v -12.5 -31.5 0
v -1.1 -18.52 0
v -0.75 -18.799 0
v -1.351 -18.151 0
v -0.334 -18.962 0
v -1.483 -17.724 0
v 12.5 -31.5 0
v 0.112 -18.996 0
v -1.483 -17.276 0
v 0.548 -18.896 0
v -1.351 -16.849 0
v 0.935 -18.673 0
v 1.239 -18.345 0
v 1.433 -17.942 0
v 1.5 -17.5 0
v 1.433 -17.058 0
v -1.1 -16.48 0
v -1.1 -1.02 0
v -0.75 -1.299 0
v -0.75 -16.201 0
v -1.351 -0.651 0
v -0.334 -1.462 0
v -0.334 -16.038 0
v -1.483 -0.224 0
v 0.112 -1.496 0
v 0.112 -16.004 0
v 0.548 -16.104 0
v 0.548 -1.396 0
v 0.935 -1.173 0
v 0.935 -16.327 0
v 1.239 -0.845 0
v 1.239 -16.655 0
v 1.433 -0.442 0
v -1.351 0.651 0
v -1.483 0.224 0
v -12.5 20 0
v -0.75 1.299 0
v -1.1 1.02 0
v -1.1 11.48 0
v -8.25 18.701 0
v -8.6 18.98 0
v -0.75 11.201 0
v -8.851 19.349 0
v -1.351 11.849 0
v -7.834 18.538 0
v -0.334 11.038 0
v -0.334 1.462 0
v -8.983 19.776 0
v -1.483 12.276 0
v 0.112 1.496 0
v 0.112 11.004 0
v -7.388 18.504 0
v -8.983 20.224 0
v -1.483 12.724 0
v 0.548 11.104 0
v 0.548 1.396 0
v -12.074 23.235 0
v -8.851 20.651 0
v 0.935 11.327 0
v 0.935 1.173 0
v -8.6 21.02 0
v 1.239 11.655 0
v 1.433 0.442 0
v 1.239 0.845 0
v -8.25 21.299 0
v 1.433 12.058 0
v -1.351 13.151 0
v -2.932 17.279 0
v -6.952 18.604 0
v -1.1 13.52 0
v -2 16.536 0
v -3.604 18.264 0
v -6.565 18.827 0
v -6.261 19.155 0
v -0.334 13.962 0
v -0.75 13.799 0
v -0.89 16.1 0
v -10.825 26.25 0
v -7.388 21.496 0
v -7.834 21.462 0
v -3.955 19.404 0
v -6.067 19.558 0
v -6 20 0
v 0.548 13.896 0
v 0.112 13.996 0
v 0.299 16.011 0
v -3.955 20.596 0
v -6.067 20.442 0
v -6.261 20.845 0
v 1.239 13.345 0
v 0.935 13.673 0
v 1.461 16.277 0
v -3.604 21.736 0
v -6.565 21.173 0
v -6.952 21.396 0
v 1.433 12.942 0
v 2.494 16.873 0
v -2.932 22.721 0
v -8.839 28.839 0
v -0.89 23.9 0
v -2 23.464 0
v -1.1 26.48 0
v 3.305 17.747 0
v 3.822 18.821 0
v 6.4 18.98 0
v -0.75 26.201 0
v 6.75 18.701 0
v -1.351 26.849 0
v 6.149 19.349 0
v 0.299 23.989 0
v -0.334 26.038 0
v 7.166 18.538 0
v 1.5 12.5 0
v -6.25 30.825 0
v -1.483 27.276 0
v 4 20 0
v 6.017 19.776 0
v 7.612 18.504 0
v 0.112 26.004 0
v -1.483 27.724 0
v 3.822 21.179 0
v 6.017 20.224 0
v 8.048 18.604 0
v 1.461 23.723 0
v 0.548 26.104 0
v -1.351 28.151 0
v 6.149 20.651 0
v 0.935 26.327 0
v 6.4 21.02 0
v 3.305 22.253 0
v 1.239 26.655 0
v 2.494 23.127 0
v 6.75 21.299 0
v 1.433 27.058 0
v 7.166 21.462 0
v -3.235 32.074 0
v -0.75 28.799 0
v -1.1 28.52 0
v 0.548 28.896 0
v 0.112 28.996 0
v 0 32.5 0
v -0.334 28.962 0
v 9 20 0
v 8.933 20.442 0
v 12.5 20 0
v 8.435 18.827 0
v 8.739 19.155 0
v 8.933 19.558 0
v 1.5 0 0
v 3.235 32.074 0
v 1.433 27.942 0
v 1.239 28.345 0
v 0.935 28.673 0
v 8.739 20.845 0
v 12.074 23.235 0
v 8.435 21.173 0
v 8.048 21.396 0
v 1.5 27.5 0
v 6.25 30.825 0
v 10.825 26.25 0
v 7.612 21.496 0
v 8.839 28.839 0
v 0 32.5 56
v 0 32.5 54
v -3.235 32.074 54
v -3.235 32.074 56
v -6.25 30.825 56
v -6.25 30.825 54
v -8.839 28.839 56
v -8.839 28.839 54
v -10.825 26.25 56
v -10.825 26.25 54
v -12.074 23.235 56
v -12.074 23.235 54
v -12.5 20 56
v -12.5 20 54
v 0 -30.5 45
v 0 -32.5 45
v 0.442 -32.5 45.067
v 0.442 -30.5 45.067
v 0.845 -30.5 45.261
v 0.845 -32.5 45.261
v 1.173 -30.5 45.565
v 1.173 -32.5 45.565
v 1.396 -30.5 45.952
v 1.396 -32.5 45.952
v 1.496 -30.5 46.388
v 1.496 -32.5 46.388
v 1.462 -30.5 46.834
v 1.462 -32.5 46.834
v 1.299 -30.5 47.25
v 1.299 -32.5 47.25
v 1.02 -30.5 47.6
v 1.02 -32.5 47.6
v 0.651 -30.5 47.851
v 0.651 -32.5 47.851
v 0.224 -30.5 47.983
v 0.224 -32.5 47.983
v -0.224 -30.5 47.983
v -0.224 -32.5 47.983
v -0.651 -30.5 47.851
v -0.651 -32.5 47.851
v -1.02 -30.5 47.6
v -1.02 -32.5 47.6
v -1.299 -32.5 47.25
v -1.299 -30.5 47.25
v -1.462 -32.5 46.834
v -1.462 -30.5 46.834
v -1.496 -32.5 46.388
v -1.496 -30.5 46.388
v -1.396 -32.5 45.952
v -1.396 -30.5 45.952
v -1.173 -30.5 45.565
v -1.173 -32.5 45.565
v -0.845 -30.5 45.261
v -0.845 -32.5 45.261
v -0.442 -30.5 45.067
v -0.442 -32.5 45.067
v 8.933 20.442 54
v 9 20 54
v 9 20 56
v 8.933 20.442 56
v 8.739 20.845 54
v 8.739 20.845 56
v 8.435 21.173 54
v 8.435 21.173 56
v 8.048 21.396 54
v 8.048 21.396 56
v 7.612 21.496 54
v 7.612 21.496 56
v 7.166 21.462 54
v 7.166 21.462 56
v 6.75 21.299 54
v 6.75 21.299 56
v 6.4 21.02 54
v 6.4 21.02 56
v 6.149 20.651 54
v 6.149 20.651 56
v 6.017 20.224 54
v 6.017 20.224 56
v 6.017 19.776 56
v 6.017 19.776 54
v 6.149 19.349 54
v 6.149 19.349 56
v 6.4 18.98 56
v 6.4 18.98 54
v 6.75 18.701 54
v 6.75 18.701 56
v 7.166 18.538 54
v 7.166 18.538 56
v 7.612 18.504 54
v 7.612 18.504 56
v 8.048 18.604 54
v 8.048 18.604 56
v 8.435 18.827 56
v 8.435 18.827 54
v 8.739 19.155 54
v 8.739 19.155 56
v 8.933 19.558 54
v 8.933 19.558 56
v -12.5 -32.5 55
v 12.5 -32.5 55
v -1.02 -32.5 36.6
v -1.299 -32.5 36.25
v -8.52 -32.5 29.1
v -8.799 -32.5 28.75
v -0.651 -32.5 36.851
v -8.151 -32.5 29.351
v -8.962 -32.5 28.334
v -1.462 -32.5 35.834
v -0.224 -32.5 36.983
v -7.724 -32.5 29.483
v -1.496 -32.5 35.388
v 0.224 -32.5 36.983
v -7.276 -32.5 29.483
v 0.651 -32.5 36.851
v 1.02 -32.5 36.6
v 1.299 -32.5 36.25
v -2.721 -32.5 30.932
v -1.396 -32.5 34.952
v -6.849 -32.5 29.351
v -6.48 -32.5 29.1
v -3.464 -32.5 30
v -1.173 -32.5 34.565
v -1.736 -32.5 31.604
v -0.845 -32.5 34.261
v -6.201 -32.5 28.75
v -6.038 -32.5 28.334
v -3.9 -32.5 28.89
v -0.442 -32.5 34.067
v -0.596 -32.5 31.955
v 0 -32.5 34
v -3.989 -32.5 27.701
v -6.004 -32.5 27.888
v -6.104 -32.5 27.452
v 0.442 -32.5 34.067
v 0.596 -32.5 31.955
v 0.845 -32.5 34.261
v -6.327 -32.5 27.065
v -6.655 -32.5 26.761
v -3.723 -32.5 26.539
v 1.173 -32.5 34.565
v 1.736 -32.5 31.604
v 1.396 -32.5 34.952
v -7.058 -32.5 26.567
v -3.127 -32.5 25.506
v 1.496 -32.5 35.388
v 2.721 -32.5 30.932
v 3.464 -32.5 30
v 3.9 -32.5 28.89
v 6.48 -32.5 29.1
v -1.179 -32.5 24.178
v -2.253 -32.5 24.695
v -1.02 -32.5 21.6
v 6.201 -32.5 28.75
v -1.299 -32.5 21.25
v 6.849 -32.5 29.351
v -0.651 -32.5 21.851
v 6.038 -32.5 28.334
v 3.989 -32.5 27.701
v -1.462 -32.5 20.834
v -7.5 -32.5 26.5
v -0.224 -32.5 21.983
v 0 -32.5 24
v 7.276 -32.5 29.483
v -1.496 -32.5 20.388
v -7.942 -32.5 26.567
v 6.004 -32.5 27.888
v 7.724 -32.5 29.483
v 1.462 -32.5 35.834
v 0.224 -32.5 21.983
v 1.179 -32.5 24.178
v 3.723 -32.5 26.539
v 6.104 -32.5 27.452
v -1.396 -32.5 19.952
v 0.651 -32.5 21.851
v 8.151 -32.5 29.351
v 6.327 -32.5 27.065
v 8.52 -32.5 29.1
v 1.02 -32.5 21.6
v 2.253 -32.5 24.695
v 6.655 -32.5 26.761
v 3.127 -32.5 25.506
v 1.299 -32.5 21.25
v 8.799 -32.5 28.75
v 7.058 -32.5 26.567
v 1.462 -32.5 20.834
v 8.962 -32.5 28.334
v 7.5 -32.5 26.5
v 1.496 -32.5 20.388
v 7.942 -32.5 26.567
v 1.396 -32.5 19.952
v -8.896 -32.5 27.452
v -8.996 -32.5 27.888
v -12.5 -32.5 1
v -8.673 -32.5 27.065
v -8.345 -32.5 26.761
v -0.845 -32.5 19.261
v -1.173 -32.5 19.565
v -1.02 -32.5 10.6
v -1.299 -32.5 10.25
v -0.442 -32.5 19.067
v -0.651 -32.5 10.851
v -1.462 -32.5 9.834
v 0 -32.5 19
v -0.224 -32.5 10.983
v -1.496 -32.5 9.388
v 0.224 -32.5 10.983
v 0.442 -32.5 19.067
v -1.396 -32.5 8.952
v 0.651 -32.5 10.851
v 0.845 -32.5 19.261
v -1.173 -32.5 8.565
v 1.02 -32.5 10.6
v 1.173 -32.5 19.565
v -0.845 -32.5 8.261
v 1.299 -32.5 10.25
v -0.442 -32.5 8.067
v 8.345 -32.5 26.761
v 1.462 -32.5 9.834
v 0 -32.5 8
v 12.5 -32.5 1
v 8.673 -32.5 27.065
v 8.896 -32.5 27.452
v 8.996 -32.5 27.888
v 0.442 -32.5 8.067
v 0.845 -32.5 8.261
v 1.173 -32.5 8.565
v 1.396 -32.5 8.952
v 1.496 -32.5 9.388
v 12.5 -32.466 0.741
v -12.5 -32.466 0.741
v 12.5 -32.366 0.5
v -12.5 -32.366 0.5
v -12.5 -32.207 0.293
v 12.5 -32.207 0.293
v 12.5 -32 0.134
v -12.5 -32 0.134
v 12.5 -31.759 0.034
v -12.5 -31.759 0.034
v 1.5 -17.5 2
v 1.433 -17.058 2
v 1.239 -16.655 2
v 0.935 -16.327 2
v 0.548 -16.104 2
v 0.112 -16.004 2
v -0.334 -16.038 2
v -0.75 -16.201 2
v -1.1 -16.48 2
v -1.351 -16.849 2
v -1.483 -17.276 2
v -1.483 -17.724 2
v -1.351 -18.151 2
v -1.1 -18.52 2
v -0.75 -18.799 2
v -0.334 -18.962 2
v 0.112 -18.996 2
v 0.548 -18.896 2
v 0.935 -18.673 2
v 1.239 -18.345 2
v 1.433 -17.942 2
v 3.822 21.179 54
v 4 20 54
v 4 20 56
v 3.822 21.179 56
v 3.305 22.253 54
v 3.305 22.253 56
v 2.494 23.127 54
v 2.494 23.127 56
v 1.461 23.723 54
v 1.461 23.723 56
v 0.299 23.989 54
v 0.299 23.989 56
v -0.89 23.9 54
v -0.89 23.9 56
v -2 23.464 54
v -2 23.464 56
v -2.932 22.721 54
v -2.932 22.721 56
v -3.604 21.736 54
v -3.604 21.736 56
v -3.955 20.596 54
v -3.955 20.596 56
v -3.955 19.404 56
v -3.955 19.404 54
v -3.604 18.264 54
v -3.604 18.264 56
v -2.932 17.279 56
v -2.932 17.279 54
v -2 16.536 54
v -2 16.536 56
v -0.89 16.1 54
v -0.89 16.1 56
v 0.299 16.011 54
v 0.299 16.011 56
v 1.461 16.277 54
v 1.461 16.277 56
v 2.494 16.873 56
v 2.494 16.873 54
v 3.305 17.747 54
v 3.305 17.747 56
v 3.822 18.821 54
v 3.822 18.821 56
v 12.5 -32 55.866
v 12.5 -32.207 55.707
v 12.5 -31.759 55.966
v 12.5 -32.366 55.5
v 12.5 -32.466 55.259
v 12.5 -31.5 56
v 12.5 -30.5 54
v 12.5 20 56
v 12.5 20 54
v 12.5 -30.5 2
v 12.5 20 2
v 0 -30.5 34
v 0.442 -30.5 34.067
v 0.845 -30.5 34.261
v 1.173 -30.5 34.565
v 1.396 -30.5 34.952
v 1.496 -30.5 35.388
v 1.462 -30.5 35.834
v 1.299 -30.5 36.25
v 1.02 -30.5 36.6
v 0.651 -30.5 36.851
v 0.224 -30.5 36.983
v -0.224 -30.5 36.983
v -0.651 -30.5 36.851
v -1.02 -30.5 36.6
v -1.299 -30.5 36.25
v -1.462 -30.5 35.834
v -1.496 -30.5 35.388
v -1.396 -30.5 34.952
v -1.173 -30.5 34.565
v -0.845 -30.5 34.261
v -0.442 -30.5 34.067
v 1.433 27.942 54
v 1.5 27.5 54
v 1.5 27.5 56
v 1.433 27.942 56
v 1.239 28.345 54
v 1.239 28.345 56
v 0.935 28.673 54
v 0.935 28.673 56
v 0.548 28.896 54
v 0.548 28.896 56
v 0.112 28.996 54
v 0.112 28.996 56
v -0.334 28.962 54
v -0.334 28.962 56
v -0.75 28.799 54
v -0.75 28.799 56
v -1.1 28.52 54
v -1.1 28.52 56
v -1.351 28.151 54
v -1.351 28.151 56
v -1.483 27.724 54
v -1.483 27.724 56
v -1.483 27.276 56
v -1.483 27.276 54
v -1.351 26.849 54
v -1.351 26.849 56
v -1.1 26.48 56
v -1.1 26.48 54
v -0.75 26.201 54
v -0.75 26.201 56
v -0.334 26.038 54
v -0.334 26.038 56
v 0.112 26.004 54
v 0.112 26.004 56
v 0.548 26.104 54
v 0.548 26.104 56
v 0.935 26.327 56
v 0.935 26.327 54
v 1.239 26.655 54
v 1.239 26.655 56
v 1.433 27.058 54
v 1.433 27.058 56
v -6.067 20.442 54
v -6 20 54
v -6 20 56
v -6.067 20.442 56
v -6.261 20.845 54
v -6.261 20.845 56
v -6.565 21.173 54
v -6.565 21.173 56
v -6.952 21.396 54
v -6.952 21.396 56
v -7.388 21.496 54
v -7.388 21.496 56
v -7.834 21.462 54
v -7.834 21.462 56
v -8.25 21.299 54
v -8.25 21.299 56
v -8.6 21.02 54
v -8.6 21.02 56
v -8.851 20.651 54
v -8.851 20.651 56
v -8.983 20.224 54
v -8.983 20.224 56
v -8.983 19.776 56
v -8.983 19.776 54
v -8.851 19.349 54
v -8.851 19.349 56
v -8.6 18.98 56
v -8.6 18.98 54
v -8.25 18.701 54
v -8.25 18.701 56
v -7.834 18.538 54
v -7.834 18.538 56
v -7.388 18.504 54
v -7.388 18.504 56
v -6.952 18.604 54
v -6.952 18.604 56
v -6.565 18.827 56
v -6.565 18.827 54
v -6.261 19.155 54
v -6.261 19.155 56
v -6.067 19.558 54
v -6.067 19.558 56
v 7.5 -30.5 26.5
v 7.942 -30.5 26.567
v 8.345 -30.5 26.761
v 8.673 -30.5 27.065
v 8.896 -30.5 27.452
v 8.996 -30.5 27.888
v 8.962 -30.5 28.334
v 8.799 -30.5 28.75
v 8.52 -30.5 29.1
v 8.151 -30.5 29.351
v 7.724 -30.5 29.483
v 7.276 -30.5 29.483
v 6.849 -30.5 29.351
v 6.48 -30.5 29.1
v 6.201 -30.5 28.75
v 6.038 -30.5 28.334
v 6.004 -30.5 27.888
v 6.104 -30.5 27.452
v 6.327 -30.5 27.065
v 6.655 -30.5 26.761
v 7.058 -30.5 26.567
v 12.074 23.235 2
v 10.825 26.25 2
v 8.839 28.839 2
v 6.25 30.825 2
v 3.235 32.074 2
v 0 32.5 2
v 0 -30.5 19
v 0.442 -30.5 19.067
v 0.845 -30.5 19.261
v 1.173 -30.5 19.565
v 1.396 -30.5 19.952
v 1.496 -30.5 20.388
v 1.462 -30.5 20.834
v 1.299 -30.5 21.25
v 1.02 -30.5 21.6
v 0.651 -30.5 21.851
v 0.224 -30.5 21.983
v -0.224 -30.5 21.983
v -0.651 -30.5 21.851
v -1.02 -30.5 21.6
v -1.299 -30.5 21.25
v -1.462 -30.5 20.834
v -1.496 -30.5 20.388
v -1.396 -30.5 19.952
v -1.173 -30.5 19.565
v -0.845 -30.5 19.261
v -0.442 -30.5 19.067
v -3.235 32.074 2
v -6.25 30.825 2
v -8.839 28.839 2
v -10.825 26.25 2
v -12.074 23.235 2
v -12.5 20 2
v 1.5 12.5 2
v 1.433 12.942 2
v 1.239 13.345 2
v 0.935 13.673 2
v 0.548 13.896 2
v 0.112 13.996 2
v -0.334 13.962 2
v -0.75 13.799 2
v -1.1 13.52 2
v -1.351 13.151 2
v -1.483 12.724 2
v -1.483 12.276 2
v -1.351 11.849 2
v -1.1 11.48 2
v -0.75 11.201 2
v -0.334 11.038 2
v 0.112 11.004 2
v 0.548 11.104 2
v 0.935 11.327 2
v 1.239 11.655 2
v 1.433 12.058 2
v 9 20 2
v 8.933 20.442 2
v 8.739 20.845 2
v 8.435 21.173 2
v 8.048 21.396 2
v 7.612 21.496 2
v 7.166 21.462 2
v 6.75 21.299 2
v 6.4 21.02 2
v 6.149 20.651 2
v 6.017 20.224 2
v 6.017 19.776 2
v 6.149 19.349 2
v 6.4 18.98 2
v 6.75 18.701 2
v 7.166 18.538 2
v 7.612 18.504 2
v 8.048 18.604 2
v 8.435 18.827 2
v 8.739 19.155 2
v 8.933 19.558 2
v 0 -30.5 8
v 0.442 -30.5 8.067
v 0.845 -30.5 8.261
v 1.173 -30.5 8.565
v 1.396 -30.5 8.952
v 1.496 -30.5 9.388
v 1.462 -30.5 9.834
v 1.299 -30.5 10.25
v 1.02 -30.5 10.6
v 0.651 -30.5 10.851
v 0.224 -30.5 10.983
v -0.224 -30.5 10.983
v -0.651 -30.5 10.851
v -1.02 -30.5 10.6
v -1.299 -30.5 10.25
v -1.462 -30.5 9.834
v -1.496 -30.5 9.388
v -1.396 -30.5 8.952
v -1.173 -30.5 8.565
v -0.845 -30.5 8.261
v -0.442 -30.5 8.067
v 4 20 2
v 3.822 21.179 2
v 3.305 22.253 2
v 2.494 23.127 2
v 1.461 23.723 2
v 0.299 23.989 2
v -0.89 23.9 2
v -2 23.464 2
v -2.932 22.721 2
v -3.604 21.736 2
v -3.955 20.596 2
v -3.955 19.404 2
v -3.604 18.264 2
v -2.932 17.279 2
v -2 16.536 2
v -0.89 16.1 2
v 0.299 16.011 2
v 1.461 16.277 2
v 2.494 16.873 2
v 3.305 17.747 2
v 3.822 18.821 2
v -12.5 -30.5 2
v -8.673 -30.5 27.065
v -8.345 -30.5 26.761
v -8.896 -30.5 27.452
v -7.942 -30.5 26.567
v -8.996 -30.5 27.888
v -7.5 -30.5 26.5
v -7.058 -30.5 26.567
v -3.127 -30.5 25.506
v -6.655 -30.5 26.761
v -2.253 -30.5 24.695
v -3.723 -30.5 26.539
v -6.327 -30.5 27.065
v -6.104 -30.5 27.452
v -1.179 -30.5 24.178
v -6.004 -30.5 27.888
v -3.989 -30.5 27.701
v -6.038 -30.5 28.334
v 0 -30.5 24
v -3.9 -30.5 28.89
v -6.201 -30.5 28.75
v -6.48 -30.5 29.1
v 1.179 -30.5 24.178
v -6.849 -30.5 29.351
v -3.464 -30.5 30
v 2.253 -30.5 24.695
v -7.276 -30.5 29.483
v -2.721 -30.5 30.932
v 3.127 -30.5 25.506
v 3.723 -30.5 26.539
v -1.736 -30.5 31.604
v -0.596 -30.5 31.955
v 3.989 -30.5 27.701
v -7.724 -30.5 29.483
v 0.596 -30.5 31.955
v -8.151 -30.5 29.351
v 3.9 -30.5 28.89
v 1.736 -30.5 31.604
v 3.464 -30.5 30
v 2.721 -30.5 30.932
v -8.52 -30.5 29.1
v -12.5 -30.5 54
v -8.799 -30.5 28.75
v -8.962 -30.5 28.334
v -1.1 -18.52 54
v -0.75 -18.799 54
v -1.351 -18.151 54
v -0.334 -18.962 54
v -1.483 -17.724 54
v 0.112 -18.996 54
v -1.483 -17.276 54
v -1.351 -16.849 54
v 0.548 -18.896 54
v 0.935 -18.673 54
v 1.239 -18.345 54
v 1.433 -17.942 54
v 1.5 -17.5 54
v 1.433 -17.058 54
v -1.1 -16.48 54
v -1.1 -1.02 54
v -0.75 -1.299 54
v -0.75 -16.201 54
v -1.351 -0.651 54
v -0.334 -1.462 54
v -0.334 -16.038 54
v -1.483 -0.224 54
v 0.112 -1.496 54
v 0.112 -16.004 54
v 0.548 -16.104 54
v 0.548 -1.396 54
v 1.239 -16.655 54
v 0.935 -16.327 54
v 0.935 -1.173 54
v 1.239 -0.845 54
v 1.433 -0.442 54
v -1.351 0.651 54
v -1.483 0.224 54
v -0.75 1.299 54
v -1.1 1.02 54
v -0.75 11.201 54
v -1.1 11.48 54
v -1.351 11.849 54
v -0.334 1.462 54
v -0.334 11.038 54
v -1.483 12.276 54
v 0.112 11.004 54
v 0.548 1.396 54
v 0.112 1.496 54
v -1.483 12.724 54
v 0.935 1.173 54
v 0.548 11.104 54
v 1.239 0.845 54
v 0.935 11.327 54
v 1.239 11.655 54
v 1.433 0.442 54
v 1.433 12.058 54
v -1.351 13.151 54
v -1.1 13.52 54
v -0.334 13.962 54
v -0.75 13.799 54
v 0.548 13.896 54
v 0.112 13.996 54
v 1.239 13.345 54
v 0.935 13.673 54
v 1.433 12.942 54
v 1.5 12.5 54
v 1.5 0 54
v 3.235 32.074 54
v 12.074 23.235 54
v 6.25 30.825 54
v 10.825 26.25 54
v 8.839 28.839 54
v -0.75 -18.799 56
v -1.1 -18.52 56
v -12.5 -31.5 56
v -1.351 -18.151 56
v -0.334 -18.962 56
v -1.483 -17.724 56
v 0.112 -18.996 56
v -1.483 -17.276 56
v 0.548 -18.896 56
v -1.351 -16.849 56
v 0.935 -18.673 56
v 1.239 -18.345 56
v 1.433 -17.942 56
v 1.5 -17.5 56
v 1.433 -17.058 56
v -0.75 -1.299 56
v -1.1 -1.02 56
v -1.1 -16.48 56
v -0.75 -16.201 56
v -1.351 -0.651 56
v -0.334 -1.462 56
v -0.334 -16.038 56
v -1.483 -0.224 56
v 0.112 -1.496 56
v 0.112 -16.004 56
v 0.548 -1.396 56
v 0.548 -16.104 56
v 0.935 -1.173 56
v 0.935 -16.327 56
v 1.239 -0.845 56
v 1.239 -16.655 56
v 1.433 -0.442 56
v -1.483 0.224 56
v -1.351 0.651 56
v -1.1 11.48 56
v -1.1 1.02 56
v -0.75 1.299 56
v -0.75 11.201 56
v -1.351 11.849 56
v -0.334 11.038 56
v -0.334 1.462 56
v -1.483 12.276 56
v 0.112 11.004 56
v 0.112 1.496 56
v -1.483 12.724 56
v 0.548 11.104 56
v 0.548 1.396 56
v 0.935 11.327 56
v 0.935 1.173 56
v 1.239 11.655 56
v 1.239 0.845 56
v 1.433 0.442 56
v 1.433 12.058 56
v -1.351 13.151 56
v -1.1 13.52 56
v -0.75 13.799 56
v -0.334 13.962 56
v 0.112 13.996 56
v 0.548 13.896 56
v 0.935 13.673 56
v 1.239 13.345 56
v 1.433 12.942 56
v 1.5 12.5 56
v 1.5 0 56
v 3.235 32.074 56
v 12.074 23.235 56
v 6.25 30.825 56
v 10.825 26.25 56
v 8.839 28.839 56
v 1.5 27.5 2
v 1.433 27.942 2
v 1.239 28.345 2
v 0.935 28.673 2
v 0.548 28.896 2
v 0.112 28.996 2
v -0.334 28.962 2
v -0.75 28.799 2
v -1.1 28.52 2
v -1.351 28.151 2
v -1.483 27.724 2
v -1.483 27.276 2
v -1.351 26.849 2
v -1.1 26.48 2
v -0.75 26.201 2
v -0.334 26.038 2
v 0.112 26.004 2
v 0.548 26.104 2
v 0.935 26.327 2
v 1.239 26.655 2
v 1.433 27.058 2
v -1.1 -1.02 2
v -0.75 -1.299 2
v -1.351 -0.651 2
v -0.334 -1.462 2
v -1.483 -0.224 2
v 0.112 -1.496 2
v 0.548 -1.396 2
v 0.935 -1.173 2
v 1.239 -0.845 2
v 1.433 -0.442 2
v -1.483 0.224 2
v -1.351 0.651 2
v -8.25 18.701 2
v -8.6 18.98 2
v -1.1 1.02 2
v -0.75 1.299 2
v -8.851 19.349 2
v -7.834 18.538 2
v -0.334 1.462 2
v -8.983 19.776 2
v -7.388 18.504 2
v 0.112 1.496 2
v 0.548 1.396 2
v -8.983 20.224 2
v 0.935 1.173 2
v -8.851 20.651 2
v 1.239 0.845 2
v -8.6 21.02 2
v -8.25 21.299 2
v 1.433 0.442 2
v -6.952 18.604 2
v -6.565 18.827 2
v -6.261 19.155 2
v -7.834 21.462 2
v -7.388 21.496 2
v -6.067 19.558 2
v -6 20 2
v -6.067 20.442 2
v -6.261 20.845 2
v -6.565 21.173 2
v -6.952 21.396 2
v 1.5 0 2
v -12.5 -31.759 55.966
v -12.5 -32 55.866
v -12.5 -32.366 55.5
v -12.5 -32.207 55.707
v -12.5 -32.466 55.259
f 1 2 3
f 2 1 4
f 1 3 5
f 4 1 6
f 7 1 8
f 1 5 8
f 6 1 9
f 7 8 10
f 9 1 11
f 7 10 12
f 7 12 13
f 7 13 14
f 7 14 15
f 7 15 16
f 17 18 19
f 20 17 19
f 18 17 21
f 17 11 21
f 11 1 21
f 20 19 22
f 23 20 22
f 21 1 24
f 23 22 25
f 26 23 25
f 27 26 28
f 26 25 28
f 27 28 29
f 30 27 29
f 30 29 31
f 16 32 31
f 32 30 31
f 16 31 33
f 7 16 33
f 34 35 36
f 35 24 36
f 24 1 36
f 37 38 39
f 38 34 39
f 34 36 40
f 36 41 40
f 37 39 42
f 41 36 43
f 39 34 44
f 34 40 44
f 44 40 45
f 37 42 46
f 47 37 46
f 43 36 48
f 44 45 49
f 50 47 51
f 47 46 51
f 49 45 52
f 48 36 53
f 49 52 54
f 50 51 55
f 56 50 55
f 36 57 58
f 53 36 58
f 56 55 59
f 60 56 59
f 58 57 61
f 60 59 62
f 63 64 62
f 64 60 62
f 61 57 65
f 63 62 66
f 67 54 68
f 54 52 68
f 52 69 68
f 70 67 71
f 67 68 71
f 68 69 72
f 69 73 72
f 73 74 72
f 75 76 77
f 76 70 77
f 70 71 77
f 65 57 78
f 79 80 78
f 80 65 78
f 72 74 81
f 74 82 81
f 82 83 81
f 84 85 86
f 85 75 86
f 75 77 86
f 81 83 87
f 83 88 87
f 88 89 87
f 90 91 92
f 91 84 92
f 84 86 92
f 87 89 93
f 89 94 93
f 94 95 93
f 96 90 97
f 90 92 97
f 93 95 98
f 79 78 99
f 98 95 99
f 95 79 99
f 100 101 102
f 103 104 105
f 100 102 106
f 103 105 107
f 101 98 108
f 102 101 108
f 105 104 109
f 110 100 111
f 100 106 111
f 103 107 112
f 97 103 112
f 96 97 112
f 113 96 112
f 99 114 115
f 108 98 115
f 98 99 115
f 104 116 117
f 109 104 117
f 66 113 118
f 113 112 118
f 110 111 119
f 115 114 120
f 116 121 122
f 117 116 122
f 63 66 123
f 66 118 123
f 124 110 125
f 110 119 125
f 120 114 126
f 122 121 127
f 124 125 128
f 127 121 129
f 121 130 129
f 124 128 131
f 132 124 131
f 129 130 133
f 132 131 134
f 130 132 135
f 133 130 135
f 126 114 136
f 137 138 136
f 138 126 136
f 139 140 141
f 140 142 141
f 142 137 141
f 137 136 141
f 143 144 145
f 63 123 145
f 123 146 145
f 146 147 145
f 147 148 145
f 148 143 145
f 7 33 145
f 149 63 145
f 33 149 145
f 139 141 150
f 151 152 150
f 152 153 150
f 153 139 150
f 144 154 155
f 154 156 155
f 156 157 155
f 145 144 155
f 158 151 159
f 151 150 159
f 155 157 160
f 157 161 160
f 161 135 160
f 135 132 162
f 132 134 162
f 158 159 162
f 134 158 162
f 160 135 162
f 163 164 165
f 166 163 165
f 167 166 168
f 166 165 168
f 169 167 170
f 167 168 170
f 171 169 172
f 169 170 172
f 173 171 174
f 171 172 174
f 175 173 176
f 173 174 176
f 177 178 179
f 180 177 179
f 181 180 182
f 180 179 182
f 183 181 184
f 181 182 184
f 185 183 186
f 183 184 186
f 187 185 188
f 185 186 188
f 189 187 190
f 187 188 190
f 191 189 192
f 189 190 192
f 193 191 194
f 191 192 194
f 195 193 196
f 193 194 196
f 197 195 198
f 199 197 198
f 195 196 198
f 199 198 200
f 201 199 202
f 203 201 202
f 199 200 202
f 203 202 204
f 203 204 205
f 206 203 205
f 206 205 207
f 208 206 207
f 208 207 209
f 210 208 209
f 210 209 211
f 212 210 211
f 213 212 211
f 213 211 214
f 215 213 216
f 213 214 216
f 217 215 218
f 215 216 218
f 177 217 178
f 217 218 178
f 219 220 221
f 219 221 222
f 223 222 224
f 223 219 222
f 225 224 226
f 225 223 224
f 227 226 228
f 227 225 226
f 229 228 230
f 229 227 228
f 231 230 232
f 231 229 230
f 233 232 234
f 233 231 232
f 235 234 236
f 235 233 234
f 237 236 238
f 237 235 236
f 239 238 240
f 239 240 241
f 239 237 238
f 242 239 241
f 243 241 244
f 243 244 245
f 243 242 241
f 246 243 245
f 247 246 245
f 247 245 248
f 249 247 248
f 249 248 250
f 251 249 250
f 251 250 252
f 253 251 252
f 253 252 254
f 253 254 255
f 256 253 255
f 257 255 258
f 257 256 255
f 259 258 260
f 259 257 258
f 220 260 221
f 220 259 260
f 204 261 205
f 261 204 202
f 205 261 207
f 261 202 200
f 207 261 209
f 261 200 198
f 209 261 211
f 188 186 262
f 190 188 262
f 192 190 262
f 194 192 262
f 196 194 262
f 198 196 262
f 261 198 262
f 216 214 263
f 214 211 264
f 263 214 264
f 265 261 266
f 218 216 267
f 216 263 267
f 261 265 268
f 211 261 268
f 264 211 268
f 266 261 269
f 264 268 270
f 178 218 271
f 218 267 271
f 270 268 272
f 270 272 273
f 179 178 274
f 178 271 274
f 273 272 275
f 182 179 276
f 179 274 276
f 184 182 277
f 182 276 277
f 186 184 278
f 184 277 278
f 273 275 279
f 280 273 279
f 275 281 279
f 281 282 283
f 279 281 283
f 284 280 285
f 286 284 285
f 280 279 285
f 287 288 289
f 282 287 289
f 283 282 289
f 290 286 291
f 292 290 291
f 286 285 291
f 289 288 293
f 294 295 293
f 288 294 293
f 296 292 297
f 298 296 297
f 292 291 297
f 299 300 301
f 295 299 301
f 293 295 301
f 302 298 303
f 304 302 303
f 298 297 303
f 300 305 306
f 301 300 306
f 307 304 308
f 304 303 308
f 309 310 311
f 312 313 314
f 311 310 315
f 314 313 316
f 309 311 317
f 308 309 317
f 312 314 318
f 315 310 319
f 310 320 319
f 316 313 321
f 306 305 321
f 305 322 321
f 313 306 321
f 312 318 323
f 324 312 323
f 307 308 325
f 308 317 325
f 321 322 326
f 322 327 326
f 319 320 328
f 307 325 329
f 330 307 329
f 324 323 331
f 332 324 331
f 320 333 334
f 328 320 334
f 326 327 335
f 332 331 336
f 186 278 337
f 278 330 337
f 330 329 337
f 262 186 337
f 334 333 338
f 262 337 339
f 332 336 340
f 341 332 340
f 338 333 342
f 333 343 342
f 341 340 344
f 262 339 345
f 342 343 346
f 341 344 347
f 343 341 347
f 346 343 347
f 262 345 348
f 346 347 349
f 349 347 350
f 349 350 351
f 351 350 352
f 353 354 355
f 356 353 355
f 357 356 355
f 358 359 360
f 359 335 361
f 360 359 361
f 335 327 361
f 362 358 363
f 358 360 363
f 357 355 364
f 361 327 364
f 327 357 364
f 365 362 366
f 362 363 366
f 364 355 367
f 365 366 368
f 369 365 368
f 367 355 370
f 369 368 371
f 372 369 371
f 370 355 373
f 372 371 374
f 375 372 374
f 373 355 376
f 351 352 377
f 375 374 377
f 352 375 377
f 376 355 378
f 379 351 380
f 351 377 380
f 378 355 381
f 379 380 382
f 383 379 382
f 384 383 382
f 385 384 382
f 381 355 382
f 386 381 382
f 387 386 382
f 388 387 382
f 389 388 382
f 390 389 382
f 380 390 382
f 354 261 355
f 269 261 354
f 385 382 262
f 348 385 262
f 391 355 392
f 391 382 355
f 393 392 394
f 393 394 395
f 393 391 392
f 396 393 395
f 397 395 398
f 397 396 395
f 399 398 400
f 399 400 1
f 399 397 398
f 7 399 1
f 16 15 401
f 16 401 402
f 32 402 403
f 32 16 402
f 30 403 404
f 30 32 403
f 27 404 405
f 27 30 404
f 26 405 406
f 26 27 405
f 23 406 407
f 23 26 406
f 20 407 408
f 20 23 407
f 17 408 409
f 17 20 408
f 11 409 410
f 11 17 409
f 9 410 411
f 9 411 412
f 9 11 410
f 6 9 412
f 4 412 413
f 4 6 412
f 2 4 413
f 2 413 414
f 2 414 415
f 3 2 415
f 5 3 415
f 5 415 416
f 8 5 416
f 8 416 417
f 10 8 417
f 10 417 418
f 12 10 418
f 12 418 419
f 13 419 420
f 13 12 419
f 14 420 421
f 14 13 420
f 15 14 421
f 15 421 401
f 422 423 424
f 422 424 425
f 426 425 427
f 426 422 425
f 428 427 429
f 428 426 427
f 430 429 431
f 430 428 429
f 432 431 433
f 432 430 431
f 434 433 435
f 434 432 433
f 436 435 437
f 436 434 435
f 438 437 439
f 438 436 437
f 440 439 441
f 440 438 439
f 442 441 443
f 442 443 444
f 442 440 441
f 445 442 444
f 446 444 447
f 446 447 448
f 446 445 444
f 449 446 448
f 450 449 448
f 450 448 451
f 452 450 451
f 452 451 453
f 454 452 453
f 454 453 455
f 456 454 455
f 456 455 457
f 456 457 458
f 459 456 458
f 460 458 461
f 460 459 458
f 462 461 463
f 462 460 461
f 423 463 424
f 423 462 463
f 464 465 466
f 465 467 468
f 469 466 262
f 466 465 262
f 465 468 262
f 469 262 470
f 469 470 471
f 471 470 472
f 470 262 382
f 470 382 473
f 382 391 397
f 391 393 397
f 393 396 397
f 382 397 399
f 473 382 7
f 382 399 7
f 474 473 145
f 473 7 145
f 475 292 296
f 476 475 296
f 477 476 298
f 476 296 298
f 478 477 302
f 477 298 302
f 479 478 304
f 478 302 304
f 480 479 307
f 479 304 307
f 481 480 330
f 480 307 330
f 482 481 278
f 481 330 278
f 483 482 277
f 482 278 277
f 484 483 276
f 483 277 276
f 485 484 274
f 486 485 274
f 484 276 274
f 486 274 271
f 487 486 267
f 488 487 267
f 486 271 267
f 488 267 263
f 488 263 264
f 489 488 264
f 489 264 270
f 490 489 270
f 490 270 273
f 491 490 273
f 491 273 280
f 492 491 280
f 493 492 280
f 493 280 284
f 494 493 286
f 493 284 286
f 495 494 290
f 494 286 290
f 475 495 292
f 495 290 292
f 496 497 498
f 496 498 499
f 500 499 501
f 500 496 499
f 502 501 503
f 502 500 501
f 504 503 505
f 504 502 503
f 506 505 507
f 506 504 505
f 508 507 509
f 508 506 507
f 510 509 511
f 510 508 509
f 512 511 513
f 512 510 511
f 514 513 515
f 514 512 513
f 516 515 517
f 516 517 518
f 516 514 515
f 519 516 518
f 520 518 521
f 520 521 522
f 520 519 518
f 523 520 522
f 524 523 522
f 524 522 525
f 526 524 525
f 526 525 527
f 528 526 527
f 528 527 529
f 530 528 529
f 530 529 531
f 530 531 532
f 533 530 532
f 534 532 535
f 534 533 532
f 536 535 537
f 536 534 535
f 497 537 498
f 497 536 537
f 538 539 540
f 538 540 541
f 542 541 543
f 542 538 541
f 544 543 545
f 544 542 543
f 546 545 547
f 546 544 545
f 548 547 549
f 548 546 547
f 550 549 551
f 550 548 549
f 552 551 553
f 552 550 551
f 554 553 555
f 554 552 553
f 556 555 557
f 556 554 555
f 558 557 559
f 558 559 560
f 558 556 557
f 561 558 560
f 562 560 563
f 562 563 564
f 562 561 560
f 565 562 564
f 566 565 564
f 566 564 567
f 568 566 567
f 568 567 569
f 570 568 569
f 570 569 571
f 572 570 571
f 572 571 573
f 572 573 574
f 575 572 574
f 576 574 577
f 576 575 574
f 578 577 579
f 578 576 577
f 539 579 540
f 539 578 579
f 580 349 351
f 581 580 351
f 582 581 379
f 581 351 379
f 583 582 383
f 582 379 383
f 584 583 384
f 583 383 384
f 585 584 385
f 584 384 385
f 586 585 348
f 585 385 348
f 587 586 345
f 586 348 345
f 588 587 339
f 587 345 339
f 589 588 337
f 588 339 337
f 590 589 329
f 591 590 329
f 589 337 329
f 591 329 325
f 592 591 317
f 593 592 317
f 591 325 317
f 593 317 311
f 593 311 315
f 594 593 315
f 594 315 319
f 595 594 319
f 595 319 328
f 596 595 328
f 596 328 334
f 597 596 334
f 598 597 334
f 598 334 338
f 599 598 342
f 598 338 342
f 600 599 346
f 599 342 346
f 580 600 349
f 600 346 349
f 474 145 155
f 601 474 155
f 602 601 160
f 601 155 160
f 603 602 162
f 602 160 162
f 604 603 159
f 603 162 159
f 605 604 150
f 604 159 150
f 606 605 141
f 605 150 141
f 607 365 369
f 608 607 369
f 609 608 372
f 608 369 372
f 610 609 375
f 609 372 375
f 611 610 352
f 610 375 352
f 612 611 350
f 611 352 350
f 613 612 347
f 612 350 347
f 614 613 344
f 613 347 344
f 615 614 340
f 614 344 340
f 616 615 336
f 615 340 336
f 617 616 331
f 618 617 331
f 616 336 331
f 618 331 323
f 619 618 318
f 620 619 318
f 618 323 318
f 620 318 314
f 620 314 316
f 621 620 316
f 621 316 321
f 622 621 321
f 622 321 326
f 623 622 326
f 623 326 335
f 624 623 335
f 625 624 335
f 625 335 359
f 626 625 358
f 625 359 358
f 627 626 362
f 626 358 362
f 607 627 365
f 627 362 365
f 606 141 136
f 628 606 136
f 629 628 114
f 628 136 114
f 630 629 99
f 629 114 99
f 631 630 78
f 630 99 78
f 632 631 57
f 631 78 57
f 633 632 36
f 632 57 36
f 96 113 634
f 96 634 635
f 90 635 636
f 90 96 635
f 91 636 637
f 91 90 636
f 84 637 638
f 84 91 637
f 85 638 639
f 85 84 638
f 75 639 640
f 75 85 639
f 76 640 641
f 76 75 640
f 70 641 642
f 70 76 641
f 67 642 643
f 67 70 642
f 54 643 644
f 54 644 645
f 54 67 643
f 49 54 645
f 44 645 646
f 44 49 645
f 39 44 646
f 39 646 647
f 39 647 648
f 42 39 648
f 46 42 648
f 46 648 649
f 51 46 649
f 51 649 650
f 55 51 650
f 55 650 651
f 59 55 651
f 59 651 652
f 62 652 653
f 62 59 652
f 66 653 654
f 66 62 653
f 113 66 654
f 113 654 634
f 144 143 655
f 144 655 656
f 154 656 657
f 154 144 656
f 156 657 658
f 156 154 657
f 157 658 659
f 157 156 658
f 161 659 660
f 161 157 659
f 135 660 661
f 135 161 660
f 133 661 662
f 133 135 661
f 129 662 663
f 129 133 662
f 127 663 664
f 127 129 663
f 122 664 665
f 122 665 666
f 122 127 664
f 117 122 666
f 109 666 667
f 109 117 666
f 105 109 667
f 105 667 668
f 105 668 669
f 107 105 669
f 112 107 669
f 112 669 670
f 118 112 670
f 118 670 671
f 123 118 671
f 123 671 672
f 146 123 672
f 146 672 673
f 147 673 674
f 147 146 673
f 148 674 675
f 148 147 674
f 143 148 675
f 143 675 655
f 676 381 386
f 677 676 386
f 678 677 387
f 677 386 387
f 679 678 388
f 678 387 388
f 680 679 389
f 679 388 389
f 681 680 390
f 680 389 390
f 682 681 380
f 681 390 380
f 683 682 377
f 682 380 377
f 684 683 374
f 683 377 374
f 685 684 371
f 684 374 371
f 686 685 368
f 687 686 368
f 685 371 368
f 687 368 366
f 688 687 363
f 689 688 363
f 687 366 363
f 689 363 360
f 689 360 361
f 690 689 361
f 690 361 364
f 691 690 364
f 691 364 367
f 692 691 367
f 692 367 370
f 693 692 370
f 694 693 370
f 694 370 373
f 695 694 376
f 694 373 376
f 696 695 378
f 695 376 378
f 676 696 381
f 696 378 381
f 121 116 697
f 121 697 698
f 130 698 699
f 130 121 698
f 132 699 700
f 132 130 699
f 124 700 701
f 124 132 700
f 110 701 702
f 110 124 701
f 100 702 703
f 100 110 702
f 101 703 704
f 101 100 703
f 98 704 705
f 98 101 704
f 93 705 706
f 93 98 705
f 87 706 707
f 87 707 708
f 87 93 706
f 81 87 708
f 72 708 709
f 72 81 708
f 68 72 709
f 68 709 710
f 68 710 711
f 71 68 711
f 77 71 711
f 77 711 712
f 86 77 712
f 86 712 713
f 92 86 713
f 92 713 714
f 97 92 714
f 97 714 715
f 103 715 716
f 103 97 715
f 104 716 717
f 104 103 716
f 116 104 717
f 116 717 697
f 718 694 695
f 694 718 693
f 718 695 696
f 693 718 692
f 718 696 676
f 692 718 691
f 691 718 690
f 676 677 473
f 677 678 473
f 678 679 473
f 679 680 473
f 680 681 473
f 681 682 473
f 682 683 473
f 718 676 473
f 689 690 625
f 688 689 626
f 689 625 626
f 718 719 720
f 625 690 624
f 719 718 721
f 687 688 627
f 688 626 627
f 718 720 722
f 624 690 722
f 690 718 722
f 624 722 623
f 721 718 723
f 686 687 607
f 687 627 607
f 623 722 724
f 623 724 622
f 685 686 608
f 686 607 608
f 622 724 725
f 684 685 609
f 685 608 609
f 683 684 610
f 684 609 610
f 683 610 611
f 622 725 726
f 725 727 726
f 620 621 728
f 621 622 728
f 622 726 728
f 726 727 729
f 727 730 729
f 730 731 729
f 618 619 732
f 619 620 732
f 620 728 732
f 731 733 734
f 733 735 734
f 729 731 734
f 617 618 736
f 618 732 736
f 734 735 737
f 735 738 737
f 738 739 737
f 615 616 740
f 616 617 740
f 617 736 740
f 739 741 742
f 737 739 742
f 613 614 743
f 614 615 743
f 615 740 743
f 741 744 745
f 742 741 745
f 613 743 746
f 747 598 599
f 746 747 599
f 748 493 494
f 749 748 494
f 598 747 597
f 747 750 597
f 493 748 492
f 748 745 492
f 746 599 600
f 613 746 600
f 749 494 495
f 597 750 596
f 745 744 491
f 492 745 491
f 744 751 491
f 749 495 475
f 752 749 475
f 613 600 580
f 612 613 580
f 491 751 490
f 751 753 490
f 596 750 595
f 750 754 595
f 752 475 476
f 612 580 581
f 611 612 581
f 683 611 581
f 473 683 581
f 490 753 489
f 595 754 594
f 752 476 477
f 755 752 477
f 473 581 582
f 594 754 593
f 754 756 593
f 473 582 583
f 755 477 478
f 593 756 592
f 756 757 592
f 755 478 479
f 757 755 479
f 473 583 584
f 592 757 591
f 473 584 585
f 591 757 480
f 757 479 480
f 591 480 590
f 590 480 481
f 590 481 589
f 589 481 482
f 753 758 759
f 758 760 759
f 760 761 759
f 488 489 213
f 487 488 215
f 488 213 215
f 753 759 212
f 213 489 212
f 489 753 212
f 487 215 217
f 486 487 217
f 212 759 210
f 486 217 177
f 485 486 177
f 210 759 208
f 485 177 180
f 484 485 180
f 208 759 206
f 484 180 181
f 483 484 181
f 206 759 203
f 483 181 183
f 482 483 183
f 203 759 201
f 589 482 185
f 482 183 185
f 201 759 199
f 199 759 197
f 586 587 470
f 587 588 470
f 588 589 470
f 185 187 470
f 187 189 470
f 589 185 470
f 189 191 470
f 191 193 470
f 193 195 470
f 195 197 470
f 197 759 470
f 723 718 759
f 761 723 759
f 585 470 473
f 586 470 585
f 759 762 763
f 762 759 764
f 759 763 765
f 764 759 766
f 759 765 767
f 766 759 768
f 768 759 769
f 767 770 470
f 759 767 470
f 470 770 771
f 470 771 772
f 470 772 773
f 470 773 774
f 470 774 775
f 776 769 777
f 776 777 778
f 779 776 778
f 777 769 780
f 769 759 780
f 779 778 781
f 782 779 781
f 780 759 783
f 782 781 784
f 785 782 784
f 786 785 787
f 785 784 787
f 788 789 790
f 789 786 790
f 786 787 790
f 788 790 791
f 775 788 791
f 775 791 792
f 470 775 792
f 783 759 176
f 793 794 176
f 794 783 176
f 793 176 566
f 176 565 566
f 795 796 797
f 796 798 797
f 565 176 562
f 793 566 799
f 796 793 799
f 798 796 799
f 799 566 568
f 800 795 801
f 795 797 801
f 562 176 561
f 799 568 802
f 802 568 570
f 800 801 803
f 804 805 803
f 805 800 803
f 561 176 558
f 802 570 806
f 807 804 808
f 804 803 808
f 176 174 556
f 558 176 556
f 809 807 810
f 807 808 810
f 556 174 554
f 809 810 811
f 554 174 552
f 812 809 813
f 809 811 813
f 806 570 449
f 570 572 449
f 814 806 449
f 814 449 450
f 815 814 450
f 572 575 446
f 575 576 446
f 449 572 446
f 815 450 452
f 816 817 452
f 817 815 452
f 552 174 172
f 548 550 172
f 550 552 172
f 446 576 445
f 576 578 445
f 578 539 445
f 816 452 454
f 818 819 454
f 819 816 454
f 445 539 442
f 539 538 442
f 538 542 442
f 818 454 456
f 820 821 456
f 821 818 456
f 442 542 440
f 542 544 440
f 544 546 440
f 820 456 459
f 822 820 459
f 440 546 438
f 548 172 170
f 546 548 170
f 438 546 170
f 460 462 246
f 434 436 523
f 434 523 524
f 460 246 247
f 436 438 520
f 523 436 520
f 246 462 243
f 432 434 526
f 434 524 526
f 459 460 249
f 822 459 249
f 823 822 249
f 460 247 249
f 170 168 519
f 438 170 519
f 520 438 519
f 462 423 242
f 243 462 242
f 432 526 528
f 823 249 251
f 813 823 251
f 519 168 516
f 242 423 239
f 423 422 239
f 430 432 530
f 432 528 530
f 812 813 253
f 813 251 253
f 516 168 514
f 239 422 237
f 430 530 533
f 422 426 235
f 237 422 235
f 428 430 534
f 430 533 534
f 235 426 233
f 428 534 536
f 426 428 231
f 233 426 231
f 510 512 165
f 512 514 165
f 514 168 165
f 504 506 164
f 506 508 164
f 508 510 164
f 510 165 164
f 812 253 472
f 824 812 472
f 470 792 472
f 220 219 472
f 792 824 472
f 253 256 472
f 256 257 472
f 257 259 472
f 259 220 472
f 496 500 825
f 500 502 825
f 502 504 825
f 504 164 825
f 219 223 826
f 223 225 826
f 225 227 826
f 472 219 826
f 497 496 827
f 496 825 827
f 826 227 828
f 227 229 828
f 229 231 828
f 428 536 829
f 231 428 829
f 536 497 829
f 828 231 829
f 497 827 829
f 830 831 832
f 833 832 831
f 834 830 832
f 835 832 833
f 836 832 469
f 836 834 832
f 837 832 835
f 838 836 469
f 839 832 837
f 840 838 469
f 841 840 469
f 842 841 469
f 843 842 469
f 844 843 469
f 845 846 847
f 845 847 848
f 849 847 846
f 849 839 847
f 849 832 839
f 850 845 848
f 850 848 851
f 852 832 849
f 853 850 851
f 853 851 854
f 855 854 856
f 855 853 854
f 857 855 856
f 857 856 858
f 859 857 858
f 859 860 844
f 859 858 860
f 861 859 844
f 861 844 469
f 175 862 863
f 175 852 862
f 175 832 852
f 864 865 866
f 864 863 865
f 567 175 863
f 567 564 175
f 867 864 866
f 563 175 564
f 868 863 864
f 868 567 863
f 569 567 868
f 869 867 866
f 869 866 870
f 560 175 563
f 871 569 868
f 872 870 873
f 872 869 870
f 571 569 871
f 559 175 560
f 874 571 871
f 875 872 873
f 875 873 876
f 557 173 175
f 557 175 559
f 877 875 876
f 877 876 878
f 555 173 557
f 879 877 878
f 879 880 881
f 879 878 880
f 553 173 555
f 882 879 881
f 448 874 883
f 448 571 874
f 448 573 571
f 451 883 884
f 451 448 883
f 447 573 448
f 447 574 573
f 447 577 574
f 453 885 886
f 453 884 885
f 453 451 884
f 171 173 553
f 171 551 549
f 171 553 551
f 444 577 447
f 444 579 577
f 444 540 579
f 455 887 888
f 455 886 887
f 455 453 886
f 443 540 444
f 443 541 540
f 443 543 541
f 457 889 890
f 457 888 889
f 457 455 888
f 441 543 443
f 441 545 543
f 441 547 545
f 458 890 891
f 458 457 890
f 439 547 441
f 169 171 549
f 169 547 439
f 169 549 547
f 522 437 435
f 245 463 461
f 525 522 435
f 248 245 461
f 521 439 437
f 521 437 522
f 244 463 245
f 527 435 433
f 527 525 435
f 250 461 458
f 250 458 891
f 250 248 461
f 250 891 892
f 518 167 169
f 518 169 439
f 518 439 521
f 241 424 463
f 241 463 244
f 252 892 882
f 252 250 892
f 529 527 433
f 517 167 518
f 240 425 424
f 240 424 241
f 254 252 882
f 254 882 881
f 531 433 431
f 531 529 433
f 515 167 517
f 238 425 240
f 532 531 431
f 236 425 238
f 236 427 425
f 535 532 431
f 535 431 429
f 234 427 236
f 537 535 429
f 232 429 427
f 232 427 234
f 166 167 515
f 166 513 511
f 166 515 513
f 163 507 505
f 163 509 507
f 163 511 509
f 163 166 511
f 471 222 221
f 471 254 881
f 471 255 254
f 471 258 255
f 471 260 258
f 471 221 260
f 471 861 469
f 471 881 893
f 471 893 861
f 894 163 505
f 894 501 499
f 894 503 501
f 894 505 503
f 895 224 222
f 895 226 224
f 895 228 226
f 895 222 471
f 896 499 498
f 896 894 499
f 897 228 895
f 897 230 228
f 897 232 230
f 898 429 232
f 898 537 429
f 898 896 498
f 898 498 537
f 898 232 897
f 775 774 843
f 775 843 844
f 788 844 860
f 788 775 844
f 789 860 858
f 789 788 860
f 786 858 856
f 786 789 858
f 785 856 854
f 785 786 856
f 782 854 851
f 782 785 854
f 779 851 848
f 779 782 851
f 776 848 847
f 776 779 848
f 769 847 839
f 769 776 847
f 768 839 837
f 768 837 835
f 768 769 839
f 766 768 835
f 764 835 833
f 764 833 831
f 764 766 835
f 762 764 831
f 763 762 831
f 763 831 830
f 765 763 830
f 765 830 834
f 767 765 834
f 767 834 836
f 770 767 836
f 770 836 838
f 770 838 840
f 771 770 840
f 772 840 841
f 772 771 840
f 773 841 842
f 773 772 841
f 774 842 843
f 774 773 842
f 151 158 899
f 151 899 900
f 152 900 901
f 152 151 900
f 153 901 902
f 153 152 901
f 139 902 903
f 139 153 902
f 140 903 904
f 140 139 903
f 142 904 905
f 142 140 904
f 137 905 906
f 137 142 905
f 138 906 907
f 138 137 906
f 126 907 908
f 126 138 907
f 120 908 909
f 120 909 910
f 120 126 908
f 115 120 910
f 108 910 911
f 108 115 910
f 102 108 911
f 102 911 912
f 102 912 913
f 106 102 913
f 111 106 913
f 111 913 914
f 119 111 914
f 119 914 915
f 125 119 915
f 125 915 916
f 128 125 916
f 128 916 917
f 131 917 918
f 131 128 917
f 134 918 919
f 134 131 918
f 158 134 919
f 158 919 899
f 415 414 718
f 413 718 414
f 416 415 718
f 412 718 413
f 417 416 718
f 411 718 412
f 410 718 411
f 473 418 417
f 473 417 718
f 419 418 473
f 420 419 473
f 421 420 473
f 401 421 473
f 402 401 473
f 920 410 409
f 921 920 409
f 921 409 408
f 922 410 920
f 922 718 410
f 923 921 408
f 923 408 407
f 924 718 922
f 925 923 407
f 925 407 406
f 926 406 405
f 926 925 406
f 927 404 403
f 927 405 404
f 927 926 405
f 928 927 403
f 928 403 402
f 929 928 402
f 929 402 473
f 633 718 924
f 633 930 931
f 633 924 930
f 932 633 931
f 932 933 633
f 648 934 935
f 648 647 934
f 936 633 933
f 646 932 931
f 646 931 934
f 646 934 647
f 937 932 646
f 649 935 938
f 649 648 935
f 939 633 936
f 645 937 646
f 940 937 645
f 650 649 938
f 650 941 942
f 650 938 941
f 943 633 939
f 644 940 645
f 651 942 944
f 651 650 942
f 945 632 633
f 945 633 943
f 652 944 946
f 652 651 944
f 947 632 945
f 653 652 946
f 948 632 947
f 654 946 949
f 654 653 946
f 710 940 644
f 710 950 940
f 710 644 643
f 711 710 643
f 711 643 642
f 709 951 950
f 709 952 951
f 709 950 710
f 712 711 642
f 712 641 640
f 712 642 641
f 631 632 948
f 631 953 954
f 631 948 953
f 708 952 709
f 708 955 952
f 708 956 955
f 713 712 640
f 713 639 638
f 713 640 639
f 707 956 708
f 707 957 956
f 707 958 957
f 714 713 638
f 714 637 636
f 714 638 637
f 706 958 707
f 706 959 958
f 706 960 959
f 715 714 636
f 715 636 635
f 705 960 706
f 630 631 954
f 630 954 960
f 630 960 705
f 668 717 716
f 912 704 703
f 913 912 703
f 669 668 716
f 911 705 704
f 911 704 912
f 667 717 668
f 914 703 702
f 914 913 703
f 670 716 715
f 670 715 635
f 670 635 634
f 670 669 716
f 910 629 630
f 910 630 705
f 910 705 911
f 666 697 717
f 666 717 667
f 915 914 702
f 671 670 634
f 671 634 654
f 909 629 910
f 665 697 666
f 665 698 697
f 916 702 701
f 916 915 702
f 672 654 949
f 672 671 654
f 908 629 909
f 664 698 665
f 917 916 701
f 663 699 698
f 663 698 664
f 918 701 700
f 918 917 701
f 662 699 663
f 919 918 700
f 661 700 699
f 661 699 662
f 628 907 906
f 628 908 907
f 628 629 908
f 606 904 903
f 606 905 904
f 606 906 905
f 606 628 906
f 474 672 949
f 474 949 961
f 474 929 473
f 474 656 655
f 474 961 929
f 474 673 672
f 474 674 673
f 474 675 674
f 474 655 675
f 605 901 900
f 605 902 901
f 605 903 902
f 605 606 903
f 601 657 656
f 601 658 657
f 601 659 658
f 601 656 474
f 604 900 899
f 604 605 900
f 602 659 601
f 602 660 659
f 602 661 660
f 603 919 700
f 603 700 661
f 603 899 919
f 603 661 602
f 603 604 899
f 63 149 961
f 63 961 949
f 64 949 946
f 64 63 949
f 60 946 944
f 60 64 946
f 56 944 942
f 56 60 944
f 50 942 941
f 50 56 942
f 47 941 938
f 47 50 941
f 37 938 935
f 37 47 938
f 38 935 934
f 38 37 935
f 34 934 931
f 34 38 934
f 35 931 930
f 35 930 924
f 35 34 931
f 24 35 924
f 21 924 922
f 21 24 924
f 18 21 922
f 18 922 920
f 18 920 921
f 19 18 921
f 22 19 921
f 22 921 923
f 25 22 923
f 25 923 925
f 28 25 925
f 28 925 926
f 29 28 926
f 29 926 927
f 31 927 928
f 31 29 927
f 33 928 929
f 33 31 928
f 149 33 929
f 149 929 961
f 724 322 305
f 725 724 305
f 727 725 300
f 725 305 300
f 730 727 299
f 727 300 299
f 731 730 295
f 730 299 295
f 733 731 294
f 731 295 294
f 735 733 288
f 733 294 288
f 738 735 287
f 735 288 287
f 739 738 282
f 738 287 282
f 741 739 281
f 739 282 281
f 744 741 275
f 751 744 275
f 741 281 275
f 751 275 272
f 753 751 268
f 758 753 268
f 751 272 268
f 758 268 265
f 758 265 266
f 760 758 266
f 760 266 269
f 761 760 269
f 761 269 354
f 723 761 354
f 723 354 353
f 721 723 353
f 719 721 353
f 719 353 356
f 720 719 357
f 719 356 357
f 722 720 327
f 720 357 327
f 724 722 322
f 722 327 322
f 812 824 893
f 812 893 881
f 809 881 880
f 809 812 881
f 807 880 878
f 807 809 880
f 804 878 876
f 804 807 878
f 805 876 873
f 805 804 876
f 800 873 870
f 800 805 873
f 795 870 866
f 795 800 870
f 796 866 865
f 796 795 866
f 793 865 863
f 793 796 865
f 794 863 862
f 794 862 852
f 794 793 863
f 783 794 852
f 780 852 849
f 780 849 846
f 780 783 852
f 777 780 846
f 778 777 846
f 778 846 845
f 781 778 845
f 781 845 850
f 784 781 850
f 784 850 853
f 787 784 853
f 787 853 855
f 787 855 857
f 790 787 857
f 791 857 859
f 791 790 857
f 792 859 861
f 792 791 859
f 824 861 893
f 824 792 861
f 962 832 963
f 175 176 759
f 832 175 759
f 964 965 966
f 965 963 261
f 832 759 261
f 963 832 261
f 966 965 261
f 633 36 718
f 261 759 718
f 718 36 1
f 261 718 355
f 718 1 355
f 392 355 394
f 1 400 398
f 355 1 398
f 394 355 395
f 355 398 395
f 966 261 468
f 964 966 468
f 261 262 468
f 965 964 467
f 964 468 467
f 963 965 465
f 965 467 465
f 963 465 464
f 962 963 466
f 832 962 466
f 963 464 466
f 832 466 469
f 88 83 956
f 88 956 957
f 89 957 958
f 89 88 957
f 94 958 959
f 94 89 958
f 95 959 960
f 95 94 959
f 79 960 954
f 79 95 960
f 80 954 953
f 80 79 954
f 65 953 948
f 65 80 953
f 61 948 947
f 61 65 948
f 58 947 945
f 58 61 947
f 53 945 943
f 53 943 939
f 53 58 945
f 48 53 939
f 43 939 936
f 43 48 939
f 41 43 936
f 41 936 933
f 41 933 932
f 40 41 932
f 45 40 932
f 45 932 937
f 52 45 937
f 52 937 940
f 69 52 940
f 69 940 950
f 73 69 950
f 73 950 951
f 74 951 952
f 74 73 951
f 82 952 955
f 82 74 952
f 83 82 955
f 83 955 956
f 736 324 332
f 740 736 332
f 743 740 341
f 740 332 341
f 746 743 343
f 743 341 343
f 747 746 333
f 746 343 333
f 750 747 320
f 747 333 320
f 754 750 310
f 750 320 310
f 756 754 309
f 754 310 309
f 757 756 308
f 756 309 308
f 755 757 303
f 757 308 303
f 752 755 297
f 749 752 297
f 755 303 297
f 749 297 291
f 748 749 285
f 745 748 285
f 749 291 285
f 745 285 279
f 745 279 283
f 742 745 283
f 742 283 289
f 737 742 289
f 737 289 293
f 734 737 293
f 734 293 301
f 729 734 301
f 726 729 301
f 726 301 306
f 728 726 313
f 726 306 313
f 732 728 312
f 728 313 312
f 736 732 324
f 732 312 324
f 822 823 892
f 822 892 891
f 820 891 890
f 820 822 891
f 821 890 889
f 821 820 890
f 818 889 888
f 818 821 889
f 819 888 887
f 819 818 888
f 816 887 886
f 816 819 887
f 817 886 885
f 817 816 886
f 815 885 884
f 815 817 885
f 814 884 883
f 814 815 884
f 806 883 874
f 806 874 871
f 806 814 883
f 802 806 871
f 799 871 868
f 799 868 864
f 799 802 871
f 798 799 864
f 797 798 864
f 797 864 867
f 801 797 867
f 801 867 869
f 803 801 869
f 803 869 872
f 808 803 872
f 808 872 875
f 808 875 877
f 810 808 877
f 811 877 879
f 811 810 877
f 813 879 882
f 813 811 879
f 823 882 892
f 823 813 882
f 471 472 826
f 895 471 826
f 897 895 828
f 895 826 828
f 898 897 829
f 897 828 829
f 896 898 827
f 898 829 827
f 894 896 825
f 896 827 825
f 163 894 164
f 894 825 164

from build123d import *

# Parameters (mm, degrees)
SKETCH1_R           = 1.5
SKETCH1_R_2         = 4
BOSS_EXTRUDE1_DEPTH = 2
SKETCH5_R           = 1.5
SKETCH5_R_2         = 4
BOSS_EXTRUDE4_DEPTH = 2
SKETCH6_W           = 25
SKETCH6_H           = 56
BOSS_EXTRUDE5_DEPTH = 2
FILLET2_R           = 1
SKETCH7_R           = 4
SKETCH7_R_2         = 1.5
CUT_EXTRUDE1_DEPTH  = 2


with BuildPart() as part:
    # Sketch1 → Boss-Extrude1 (new body)
    with BuildSketch(Plane.XY):
        with BuildLine():
            Line((-12.5, -32.5), (12.5, -32.5))
            Line((12.5, -32.5), (12.5, 7.5))
            Line((12.5, 7.5), (12.5, 20))
            ThreePointArc((12.5, 20), (8.838834758, 28.838834772), (-2e-08, 32.5))
            ThreePointArc((-2e-08, 32.5), (-8.838834772, 28.838834758), (-12.5, 20))
            Line((-12.5, 20), (-12.5, 7.5))
            Line((-12.5, 7.5), (-12.5, -32.5))
        make_face()
        with Locations((0, -17.5)):
            Circle(SKETCH1_R, mode=Mode.SUBTRACT)
        Circle(SKETCH1_R, mode=Mode.SUBTRACT)
        with Locations((0, 12.5)):
            Circle(SKETCH1_R, mode=Mode.SUBTRACT)
        with Locations((-7.5, 20)):
            Circle(SKETCH1_R, mode=Mode.SUBTRACT)
        with Locations((0, 20)):
            Circle(SKETCH1_R_2, mode=Mode.SUBTRACT)
        with Locations((0, 27.5)):
            Circle(SKETCH1_R, mode=Mode.SUBTRACT)
        with Locations((7.5, 20)):
            Circle(SKETCH1_R, mode=Mode.SUBTRACT)
    extrude(amount=BOSS_EXTRUDE1_DEPTH)



with BuildPart() as body_2:
    # Sketch5 → Boss-Extrude4 (new body)
    with BuildSketch(Plane.XY.offset(54)):
        with BuildLine():
            Line((-12.5, -32.5), (12.5, -32.5))
            Line((12.5, -32.5), (12.5, 7.5))
            Line((12.5, 7.5), (12.5, 20))
            ThreePointArc((12.5, 20), (8.838834758, 28.838834772), (-2e-08, 32.5))
            ThreePointArc((-2e-08, 32.5), (-8.838834772, 28.838834758), (-12.5, 20))
            Line((-12.5, 20), (-12.5, 7.5))
            Line((-12.5, 7.5), (-12.5, -32.5))
        make_face()
        with Locations((0, -17.5)):
            Circle(SKETCH5_R, mode=Mode.SUBTRACT)
        Circle(SKETCH5_R, mode=Mode.SUBTRACT)
        with Locations((0, 12.5)):
            Circle(SKETCH5_R, mode=Mode.SUBTRACT)
        with Locations((-7.5, 20)):
            Circle(SKETCH5_R, mode=Mode.SUBTRACT)
        with Locations((0, 20)):
            Circle(SKETCH5_R_2, mode=Mode.SUBTRACT)
        with Locations((0, 27.5)):
            Circle(SKETCH5_R, mode=Mode.SUBTRACT)
        with Locations((7.5, 20)):
            Circle(SKETCH5_R, mode=Mode.SUBTRACT)
    extrude(amount=BOSS_EXTRUDE4_DEPTH)


with BuildPart() as part_1:
    add(part.part)

    add(body_2.part)  # Boss-Extrude5 merges body 2
    # Sketch6 → Boss-Extrude5 (add)
    with BuildSketch(Plane.XZ.offset(32.5)):
        with Locations((0, 28)):
            Rectangle(SKETCH6_W, SKETCH6_H)
    extrude(amount=-BOSS_EXTRUDE5_DEPTH)

    # Fillet2
    fillet2_edges = [part_1.edges().sort_by_distance(p)[0] for p in [
        (0, -32.5, 0),
        (0, -32.5, 56),
    ]]
    fillet(fillet2_edges, radius=FILLET2_R)

    # Sketch7 → Cut-Extrude1 (cut)
    with BuildSketch(Plane(origin=(0, -32.5, 0), x_dir=(-1, 0, 0), z_dir=(0, -1, 0))):
        with Locations(Location((0, -28, 0), (0, 0, 90))):
            Circle(SKETCH7_R)
        with Locations(Location((7.5, -28, 0), (0, 0, 90))):
            Circle(SKETCH7_R_2)
        with Locations(Location((0, -35.5, 0), (0, 0, 90))):
            Circle(SKETCH7_R_2)
        with Locations(Location((-7.5, -28, 0), (0, 0, 90))):
            Circle(SKETCH7_R_2)
        with Locations(Location((0, -20.5, 0), (0, 0, 90))):
            Circle(SKETCH7_R_2)
        with Locations(Location((0, -46.5, 0), (0, 0, 90))):
            Circle(SKETCH7_R_2)
        with Locations(Location((0, -9.5, 0), (0, 0, 90))):
            Circle(SKETCH7_R_2)
    extrude(amount=-CUT_EXTRUDE1_DEPTH, mode=Mode.SUBTRACT)


solid = part_1.part
